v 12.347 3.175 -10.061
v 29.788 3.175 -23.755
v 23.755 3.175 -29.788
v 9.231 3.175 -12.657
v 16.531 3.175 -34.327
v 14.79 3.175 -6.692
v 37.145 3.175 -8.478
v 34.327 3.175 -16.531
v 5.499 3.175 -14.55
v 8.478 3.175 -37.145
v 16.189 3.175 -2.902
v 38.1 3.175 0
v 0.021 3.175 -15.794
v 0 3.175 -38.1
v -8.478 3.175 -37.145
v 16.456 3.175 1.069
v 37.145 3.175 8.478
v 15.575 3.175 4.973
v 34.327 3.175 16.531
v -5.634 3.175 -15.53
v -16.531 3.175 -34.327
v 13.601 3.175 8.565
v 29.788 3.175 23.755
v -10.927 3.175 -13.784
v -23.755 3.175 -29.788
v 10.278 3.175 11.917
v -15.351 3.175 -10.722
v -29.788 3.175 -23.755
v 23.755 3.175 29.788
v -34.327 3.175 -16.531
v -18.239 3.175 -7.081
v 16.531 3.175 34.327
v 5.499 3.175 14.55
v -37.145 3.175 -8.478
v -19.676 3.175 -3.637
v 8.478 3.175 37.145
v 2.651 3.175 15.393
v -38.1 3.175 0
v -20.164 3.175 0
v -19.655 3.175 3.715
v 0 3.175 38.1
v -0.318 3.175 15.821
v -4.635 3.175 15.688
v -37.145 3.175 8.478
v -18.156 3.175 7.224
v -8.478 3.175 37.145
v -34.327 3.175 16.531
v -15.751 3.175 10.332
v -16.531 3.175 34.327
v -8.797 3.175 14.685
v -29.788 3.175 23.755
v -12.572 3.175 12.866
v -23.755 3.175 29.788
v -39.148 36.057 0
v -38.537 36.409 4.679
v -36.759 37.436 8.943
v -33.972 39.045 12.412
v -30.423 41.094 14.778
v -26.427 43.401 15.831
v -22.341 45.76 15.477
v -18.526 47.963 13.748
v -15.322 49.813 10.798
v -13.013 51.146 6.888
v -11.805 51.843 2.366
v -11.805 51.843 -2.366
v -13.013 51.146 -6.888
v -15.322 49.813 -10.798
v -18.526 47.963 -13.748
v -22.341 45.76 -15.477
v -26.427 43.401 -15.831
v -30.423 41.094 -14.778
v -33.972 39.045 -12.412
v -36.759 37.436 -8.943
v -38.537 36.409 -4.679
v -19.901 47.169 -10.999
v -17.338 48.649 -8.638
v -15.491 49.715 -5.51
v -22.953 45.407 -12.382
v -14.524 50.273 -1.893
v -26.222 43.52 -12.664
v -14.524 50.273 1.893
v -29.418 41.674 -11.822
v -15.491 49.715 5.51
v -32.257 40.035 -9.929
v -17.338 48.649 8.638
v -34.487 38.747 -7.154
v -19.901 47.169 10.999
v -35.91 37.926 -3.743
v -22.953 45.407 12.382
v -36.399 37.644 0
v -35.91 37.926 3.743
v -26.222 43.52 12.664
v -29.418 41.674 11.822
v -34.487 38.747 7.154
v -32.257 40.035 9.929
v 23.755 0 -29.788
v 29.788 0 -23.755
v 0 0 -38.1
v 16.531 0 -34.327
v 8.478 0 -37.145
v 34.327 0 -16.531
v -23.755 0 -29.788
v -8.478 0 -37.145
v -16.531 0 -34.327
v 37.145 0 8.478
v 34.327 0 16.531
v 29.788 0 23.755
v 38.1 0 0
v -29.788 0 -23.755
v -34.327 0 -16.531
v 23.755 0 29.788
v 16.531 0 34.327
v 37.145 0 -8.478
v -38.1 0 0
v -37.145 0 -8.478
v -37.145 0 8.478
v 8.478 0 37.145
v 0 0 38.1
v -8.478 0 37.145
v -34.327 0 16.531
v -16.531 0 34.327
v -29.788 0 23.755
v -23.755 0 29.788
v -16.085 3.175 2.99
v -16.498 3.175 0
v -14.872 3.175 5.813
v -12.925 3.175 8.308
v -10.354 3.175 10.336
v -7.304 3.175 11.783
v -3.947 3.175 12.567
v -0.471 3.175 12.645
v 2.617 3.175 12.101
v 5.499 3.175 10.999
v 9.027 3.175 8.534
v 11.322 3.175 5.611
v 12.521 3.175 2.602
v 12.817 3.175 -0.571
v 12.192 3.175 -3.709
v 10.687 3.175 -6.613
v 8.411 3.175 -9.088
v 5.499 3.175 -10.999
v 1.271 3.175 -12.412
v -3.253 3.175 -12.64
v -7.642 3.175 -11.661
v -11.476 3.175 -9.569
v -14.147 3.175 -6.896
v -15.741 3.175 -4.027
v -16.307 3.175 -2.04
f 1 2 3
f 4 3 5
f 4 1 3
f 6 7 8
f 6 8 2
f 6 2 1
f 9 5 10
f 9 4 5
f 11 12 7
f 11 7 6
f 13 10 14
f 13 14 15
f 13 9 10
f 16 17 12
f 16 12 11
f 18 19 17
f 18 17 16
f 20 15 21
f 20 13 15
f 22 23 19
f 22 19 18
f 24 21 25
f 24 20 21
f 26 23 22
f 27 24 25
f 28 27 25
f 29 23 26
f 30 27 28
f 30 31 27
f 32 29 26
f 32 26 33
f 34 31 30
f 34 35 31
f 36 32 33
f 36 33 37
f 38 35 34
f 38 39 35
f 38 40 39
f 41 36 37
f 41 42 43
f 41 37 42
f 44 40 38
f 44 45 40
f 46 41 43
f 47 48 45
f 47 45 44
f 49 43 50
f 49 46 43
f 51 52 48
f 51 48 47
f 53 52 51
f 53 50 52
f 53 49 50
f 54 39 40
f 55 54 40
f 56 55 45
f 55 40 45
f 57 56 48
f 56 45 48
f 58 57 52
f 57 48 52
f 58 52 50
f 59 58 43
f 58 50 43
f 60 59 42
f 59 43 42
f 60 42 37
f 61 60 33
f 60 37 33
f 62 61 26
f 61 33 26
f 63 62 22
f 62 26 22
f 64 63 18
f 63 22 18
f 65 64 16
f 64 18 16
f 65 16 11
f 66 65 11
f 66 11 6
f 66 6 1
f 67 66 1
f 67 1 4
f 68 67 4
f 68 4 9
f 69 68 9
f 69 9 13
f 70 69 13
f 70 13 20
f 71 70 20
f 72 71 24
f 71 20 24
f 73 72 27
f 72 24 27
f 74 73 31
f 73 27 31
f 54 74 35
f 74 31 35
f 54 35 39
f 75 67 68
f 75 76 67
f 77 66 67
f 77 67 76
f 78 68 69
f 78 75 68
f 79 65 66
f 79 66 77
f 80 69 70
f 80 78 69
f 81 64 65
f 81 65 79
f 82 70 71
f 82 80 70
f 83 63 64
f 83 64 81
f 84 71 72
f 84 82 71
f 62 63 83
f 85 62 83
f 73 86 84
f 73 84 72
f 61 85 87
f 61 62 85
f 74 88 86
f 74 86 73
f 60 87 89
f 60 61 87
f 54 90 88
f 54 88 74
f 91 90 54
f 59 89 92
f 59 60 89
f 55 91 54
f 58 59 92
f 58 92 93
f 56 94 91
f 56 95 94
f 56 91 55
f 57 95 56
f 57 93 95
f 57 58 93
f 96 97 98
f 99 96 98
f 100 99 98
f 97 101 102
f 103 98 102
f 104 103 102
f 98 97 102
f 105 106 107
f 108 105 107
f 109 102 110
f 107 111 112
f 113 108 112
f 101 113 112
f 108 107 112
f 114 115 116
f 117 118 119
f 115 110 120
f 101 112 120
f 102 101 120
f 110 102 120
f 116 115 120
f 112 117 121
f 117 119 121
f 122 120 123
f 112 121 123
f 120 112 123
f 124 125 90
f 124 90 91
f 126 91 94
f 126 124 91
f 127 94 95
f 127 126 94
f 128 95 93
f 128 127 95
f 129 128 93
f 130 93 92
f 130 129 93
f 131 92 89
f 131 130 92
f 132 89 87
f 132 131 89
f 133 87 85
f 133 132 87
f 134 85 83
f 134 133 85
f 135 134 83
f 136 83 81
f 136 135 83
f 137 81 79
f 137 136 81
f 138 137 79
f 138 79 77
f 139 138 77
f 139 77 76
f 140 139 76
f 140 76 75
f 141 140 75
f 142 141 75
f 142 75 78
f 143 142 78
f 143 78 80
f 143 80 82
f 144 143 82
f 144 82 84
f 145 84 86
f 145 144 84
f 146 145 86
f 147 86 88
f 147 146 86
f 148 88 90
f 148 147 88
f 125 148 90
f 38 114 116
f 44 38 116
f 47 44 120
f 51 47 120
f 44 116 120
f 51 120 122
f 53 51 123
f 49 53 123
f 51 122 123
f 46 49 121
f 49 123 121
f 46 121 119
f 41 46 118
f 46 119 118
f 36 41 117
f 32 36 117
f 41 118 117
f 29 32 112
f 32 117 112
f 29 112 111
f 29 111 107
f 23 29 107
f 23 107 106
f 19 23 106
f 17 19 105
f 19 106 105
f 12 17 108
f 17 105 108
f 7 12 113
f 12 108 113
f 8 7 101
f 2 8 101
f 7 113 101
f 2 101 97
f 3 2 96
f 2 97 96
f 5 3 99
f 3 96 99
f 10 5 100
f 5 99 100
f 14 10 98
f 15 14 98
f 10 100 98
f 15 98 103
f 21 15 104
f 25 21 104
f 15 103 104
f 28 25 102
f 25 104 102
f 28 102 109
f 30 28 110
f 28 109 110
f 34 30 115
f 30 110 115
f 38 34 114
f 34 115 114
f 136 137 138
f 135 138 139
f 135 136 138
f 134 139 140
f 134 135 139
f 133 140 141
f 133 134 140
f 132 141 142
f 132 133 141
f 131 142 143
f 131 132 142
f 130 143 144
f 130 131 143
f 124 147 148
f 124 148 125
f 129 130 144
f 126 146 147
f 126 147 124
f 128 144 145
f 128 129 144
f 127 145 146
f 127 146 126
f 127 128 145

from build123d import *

# Parameters (mm, degrees)
F2_R          = 38.1
F3_DEPTH      = 3.175
F6_R          = 15.875
F6_R_2        = 12.7
F7_DEPTH      = 50.8
F7_DEPTH_BACK = 6.35
F9_DEPTH      = 25.4
F9_DEPTH_BACK = 25.4


with BuildPart() as f3:
    # F2 (on line) → F3 (new body)
    with BuildSketch(Plane(origin=(0, 0, 0), x_dir=(-1, 0, 0), z_dir=(0, 1, 0))):
        Circle(F2_R)
    extrude(amount=F3_DEPTH)

    # F6 (on line) → F7 (join, two sides)
    with BuildSketch(Plane(origin=(0, 0, 0), x_dir=(-0.8660254038, -0.5, 0), z_dir=(-0.5, 0.8660254038, 0))) as f7_sk:
        Circle(F6_R)
        Circle(F6_R_2, mode=Mode.SUBTRACT)
    extrude(amount=F7_DEPTH)
    extrude(f7_sk.sketch, amount=-F7_DEPTH_BACK)

    # F8 (on Right) → F9 (cut, two sides)
    with BuildSketch(Plane.YZ) as f9_sk:
        Polygon((0, -20.3028712422), (0, 23.2852003007), (-20.0170747743, 19.199454845), (-8.2928827169, -22.6273914554), align=None)
    extrude(amount=-F9_DEPTH, mode=Mode.SUBTRACT)
    extrude(f9_sk.sketch, amount=F9_DEPTH_BACK, mode=Mode.SUBTRACT)


solid = f3.part
